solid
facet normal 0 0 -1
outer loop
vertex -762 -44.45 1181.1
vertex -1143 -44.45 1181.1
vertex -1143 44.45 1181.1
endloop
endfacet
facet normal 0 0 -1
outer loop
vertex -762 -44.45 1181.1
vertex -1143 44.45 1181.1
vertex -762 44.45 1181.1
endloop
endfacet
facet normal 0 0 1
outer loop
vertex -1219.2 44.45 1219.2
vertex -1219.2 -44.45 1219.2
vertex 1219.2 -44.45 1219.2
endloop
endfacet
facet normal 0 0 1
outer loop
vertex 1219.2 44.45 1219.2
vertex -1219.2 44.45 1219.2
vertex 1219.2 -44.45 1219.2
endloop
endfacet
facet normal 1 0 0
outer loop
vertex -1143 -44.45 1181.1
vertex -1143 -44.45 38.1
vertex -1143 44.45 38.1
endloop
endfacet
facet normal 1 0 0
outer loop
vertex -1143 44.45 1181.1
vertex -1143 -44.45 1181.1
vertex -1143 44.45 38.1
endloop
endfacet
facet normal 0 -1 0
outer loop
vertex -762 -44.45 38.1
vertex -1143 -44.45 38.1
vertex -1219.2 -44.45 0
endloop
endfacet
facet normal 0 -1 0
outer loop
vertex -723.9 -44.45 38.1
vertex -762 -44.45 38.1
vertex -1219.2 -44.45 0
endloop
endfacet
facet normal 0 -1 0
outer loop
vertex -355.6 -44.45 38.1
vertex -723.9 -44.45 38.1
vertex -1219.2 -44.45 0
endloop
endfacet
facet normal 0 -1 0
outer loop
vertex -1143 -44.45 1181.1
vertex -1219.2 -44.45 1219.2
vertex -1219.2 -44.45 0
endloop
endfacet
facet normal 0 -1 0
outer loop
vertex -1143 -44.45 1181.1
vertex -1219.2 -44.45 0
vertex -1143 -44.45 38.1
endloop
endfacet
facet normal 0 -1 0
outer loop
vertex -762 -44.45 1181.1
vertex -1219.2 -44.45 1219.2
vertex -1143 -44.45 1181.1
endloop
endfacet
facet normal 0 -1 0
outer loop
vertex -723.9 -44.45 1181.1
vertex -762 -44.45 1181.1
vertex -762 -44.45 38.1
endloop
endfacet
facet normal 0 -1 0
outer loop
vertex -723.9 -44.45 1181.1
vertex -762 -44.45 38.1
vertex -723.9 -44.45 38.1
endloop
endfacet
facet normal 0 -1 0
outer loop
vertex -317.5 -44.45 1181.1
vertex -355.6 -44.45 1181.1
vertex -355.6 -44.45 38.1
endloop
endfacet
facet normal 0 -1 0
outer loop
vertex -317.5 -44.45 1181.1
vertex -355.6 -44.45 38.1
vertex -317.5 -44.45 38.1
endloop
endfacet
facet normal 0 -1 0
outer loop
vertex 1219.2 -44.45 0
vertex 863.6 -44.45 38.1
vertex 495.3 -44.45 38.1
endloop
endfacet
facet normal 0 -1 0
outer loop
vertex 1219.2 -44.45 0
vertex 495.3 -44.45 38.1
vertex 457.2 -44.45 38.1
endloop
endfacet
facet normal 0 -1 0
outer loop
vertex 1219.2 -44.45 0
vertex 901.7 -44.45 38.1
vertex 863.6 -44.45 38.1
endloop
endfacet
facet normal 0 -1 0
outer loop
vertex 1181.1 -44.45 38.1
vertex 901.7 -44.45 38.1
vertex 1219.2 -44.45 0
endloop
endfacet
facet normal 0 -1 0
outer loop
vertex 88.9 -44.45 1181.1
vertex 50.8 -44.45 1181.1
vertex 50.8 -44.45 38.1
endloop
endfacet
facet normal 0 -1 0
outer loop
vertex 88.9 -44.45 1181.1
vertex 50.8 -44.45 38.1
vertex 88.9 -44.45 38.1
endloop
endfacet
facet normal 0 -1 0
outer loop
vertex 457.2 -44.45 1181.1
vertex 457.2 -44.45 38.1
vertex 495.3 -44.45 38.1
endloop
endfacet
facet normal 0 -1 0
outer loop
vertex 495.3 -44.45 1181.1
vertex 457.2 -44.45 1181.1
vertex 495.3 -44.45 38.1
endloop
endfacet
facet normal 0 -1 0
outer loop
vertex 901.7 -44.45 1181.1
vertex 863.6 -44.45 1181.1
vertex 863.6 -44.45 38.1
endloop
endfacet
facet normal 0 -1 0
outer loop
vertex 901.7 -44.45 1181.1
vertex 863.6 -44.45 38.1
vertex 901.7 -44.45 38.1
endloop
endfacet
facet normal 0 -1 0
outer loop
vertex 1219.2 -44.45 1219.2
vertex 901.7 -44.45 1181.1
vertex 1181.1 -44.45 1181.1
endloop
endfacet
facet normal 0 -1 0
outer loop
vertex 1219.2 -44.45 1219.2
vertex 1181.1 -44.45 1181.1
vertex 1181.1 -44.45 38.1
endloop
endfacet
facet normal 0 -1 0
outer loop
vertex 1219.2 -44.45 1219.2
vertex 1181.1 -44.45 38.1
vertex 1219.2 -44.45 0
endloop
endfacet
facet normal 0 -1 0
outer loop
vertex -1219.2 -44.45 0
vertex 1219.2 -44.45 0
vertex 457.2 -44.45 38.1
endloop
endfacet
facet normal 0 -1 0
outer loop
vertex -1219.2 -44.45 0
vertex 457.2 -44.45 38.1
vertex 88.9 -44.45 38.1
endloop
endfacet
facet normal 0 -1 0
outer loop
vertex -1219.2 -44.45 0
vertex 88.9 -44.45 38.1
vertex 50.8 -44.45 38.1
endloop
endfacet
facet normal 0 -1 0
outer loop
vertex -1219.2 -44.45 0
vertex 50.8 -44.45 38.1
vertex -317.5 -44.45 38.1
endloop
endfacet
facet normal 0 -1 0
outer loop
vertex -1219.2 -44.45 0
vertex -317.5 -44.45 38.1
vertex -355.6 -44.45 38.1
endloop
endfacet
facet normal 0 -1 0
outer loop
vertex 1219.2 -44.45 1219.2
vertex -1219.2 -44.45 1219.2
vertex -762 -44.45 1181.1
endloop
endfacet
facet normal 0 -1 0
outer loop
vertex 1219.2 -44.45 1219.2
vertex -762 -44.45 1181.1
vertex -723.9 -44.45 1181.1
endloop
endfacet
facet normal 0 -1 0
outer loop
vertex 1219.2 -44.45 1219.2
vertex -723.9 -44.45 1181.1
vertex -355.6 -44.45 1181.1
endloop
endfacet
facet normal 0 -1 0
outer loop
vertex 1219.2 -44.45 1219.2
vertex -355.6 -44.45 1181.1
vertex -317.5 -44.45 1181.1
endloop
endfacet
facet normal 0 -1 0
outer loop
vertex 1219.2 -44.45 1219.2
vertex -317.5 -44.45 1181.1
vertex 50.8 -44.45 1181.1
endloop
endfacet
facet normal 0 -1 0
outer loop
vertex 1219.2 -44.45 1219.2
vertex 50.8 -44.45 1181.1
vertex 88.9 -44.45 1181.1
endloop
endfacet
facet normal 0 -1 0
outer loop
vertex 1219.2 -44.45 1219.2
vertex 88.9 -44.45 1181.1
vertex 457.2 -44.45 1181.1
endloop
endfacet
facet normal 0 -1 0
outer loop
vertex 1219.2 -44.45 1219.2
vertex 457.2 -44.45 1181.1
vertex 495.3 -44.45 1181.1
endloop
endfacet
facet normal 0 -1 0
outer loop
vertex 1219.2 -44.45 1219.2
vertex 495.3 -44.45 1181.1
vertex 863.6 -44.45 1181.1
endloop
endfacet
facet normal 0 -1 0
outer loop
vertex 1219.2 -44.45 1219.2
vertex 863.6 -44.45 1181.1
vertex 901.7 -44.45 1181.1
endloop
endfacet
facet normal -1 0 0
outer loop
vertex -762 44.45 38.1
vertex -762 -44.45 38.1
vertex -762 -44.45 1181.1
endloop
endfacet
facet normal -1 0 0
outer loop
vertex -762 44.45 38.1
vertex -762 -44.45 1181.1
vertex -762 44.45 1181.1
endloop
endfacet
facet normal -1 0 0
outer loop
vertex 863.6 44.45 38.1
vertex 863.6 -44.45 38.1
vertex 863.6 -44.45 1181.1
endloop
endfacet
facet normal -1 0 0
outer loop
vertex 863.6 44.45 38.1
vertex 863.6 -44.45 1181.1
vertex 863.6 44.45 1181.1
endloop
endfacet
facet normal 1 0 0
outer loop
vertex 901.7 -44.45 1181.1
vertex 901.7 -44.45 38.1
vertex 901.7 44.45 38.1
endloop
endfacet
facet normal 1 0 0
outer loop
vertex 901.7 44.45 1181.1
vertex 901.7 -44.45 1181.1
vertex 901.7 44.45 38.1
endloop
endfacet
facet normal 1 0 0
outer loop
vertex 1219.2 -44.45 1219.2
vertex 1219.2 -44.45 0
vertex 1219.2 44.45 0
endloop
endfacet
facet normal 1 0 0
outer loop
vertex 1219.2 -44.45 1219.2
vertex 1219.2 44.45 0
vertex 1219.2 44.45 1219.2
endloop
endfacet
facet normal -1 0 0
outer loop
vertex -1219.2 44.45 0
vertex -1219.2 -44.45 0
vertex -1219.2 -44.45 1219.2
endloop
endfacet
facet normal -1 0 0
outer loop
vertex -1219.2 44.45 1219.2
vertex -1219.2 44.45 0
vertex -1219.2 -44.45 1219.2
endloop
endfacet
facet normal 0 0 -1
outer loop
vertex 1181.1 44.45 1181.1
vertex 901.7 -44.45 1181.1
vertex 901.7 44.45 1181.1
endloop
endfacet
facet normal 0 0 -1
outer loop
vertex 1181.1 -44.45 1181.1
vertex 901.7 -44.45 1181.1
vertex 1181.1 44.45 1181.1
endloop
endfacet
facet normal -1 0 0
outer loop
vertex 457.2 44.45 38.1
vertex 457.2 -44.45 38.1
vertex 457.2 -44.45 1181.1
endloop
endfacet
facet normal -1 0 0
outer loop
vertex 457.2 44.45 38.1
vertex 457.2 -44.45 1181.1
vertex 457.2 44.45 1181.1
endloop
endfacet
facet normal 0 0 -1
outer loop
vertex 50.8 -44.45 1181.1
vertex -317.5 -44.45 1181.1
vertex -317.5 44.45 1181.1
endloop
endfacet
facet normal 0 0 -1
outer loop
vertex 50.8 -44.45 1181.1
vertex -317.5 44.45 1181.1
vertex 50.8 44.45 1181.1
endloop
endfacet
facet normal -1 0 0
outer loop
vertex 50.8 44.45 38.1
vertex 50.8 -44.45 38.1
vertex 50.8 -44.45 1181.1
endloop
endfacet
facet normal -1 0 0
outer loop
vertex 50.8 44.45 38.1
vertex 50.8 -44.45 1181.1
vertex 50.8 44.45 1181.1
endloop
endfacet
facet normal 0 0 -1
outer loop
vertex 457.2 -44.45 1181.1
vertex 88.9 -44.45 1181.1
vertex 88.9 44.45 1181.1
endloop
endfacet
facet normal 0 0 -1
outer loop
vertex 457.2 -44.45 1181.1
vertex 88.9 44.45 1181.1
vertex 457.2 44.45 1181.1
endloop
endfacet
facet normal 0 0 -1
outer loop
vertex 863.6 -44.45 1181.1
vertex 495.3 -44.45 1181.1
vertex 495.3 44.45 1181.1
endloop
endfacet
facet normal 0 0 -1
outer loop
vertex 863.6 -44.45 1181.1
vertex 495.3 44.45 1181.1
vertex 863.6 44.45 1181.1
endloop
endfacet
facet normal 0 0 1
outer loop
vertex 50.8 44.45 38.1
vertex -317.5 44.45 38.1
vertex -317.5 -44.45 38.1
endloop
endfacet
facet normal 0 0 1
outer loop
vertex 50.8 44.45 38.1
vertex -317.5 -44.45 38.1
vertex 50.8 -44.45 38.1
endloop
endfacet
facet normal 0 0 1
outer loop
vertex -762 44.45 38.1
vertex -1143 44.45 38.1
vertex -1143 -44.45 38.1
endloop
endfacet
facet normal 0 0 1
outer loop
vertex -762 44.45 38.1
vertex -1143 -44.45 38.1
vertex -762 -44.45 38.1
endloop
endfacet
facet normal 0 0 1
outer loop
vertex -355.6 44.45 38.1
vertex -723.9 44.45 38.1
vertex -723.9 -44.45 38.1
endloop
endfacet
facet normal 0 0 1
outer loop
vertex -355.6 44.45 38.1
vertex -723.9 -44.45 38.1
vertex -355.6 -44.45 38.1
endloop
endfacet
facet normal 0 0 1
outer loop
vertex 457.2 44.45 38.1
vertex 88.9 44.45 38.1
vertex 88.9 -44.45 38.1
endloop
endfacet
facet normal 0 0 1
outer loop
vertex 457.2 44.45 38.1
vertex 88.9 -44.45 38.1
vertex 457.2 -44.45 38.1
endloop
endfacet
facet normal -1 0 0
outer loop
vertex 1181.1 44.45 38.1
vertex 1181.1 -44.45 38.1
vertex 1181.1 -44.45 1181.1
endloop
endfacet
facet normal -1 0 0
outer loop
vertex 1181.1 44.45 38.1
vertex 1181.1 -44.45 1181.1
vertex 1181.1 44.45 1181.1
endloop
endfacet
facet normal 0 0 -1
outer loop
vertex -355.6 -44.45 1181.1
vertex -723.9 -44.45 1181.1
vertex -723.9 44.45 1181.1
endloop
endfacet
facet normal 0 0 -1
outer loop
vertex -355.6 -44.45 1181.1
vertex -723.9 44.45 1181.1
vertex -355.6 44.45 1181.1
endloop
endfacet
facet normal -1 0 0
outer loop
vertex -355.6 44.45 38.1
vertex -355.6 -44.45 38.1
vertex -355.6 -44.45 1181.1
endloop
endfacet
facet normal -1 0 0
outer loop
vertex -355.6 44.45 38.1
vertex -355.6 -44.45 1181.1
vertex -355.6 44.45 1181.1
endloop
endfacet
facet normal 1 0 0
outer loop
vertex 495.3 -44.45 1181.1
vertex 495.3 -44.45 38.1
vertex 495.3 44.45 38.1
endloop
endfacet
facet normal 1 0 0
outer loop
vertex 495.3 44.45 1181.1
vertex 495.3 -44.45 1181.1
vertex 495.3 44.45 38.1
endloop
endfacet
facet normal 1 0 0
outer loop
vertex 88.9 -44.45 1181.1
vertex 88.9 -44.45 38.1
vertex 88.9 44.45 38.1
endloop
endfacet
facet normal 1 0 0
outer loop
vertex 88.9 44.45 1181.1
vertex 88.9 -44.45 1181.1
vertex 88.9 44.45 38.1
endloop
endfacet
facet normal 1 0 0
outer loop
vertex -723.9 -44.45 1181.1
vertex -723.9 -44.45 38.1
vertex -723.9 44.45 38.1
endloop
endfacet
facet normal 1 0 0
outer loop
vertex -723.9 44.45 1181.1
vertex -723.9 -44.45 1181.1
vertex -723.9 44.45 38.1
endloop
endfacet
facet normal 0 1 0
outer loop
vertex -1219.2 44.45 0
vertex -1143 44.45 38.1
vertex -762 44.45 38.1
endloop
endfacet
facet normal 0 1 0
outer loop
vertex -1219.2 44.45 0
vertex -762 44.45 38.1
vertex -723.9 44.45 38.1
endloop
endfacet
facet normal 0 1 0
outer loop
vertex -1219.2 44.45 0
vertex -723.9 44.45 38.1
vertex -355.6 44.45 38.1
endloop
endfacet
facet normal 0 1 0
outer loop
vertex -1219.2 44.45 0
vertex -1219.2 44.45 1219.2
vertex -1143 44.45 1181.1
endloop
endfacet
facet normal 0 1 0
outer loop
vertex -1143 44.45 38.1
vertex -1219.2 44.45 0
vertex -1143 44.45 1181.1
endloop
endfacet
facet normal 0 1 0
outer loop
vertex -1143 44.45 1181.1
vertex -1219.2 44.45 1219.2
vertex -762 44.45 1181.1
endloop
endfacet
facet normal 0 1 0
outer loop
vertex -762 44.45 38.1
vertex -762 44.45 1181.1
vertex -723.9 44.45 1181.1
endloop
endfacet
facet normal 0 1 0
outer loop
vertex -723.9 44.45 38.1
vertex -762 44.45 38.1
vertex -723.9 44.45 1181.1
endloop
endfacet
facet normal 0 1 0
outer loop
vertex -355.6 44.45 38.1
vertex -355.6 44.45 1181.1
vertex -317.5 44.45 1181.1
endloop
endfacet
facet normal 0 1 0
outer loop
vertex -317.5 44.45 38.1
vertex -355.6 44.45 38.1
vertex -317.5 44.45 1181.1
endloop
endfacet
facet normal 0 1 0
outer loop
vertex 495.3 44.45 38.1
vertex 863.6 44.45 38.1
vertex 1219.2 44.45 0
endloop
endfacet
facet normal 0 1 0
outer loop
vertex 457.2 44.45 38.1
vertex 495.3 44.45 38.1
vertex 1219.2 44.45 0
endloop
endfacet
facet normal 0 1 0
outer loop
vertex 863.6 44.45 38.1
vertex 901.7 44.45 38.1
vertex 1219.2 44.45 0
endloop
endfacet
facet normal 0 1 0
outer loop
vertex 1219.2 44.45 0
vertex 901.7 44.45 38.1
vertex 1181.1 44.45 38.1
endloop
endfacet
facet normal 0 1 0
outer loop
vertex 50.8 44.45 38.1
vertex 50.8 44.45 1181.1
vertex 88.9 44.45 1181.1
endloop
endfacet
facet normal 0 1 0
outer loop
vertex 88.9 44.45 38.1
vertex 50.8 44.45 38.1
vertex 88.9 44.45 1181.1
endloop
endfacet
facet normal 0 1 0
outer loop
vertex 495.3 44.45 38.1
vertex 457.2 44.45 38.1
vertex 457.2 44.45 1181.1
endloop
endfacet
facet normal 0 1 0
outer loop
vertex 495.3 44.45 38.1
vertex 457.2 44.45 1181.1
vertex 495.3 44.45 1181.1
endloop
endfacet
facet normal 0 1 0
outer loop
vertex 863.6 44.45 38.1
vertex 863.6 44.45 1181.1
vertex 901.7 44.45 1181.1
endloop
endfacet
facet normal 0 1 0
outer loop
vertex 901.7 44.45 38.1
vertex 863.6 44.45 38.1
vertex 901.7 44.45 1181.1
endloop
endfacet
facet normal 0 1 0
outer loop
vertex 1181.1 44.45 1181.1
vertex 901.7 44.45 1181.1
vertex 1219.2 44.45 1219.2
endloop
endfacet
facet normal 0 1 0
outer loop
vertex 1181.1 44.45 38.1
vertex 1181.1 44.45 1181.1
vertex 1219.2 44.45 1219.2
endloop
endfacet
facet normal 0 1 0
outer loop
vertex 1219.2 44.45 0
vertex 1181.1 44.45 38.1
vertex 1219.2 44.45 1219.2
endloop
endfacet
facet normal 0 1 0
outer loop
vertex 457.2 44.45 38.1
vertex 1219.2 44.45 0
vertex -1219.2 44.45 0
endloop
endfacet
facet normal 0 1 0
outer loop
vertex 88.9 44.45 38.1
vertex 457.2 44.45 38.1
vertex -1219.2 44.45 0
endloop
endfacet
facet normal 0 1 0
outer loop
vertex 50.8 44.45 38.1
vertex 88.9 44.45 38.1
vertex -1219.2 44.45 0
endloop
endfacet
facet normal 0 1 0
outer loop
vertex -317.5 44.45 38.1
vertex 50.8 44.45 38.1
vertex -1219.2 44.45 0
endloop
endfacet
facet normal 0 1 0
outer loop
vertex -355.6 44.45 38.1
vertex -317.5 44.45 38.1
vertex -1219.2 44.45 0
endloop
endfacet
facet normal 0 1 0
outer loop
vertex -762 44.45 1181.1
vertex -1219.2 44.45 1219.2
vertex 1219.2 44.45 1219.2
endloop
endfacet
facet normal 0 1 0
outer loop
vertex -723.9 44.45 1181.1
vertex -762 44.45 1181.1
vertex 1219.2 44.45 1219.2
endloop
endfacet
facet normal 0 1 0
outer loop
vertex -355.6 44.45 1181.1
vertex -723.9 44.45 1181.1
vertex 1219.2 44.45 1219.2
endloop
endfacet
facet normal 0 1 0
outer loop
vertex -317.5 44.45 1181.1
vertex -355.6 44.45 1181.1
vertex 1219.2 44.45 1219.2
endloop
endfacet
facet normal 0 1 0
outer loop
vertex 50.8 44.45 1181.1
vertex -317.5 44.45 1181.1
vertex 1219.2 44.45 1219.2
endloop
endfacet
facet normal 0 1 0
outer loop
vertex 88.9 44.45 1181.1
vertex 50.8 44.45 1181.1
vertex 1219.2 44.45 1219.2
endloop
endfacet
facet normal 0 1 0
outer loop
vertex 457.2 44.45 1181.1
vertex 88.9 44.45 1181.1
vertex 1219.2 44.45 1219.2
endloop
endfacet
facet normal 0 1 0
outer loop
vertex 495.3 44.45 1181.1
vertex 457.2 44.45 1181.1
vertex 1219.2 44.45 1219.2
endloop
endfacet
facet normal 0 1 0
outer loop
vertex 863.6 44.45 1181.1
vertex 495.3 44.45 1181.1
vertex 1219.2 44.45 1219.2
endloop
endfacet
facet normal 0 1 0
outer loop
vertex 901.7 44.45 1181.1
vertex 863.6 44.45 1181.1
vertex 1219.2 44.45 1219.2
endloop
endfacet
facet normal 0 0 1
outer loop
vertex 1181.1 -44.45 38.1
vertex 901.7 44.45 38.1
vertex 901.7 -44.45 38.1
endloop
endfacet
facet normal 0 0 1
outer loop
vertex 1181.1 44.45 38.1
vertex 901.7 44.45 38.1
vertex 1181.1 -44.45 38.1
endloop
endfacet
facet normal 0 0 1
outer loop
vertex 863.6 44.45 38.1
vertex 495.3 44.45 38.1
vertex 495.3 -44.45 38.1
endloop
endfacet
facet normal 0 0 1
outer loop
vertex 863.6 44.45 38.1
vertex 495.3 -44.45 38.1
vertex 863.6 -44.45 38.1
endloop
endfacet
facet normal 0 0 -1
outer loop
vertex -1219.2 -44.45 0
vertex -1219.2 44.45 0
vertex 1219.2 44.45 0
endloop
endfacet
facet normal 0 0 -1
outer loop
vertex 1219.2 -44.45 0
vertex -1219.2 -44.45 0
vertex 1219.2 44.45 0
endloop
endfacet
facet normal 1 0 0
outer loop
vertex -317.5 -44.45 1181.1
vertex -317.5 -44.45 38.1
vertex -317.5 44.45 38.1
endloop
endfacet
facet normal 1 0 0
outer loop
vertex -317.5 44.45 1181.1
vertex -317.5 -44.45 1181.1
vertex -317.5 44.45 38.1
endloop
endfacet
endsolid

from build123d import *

# Parameters (mm, degrees)
F0_W     = 2438.4
F0_H     = 88.9
F1_DEPTH = 38.1
F2_W     = 38.1
F2_H     = 88.9
F3_DEPTH = 1143
F4_W     = 2438.4
F4_H     = 38.1
F5_DEPTH = 88.9


with BuildPart() as f1:
    # F0 (on Top) → F1 (new body)
    with BuildSketch(Plane.XY):
        Rectangle(F0_W, F0_H)
    extrude(amount=F1_DEPTH)

    # F2 (on face) → F3 (join)
    with BuildSketch(Plane.XY.offset(38.1)):
        with Locations((1200.15, 0)):
            Rectangle(F2_W, F2_H)
        with Locations((882.65, 0)):
            Rectangle(F2_W, F2_H)
        with Locations((476.25, 0)):
            Rectangle(F2_W, F2_H)
        with Locations((69.85, 0)):
            Rectangle(F2_W, F2_H)
        with Locations((-336.55, 0)):
            Rectangle(F2_W, F2_H)
        with Locations((-742.95, 0)):
            Rectangle(F2_W, F2_H)
        with Locations((-1200.15, 0)):
            Rectangle(F2_W, F2_H)
        with Locations((-1162.05, 0)):
            Rectangle(F2_W, F2_H)
    extrude(amount=F3_DEPTH)

    # F4 (on face) → F5 (join)
    with BuildSketch(Plane.XZ.offset(44.45)):
        with Locations((0, 1200.15)):
            Rectangle(F4_W, F4_H)
    extrude(amount=-F5_DEPTH)


solid = f1.part
